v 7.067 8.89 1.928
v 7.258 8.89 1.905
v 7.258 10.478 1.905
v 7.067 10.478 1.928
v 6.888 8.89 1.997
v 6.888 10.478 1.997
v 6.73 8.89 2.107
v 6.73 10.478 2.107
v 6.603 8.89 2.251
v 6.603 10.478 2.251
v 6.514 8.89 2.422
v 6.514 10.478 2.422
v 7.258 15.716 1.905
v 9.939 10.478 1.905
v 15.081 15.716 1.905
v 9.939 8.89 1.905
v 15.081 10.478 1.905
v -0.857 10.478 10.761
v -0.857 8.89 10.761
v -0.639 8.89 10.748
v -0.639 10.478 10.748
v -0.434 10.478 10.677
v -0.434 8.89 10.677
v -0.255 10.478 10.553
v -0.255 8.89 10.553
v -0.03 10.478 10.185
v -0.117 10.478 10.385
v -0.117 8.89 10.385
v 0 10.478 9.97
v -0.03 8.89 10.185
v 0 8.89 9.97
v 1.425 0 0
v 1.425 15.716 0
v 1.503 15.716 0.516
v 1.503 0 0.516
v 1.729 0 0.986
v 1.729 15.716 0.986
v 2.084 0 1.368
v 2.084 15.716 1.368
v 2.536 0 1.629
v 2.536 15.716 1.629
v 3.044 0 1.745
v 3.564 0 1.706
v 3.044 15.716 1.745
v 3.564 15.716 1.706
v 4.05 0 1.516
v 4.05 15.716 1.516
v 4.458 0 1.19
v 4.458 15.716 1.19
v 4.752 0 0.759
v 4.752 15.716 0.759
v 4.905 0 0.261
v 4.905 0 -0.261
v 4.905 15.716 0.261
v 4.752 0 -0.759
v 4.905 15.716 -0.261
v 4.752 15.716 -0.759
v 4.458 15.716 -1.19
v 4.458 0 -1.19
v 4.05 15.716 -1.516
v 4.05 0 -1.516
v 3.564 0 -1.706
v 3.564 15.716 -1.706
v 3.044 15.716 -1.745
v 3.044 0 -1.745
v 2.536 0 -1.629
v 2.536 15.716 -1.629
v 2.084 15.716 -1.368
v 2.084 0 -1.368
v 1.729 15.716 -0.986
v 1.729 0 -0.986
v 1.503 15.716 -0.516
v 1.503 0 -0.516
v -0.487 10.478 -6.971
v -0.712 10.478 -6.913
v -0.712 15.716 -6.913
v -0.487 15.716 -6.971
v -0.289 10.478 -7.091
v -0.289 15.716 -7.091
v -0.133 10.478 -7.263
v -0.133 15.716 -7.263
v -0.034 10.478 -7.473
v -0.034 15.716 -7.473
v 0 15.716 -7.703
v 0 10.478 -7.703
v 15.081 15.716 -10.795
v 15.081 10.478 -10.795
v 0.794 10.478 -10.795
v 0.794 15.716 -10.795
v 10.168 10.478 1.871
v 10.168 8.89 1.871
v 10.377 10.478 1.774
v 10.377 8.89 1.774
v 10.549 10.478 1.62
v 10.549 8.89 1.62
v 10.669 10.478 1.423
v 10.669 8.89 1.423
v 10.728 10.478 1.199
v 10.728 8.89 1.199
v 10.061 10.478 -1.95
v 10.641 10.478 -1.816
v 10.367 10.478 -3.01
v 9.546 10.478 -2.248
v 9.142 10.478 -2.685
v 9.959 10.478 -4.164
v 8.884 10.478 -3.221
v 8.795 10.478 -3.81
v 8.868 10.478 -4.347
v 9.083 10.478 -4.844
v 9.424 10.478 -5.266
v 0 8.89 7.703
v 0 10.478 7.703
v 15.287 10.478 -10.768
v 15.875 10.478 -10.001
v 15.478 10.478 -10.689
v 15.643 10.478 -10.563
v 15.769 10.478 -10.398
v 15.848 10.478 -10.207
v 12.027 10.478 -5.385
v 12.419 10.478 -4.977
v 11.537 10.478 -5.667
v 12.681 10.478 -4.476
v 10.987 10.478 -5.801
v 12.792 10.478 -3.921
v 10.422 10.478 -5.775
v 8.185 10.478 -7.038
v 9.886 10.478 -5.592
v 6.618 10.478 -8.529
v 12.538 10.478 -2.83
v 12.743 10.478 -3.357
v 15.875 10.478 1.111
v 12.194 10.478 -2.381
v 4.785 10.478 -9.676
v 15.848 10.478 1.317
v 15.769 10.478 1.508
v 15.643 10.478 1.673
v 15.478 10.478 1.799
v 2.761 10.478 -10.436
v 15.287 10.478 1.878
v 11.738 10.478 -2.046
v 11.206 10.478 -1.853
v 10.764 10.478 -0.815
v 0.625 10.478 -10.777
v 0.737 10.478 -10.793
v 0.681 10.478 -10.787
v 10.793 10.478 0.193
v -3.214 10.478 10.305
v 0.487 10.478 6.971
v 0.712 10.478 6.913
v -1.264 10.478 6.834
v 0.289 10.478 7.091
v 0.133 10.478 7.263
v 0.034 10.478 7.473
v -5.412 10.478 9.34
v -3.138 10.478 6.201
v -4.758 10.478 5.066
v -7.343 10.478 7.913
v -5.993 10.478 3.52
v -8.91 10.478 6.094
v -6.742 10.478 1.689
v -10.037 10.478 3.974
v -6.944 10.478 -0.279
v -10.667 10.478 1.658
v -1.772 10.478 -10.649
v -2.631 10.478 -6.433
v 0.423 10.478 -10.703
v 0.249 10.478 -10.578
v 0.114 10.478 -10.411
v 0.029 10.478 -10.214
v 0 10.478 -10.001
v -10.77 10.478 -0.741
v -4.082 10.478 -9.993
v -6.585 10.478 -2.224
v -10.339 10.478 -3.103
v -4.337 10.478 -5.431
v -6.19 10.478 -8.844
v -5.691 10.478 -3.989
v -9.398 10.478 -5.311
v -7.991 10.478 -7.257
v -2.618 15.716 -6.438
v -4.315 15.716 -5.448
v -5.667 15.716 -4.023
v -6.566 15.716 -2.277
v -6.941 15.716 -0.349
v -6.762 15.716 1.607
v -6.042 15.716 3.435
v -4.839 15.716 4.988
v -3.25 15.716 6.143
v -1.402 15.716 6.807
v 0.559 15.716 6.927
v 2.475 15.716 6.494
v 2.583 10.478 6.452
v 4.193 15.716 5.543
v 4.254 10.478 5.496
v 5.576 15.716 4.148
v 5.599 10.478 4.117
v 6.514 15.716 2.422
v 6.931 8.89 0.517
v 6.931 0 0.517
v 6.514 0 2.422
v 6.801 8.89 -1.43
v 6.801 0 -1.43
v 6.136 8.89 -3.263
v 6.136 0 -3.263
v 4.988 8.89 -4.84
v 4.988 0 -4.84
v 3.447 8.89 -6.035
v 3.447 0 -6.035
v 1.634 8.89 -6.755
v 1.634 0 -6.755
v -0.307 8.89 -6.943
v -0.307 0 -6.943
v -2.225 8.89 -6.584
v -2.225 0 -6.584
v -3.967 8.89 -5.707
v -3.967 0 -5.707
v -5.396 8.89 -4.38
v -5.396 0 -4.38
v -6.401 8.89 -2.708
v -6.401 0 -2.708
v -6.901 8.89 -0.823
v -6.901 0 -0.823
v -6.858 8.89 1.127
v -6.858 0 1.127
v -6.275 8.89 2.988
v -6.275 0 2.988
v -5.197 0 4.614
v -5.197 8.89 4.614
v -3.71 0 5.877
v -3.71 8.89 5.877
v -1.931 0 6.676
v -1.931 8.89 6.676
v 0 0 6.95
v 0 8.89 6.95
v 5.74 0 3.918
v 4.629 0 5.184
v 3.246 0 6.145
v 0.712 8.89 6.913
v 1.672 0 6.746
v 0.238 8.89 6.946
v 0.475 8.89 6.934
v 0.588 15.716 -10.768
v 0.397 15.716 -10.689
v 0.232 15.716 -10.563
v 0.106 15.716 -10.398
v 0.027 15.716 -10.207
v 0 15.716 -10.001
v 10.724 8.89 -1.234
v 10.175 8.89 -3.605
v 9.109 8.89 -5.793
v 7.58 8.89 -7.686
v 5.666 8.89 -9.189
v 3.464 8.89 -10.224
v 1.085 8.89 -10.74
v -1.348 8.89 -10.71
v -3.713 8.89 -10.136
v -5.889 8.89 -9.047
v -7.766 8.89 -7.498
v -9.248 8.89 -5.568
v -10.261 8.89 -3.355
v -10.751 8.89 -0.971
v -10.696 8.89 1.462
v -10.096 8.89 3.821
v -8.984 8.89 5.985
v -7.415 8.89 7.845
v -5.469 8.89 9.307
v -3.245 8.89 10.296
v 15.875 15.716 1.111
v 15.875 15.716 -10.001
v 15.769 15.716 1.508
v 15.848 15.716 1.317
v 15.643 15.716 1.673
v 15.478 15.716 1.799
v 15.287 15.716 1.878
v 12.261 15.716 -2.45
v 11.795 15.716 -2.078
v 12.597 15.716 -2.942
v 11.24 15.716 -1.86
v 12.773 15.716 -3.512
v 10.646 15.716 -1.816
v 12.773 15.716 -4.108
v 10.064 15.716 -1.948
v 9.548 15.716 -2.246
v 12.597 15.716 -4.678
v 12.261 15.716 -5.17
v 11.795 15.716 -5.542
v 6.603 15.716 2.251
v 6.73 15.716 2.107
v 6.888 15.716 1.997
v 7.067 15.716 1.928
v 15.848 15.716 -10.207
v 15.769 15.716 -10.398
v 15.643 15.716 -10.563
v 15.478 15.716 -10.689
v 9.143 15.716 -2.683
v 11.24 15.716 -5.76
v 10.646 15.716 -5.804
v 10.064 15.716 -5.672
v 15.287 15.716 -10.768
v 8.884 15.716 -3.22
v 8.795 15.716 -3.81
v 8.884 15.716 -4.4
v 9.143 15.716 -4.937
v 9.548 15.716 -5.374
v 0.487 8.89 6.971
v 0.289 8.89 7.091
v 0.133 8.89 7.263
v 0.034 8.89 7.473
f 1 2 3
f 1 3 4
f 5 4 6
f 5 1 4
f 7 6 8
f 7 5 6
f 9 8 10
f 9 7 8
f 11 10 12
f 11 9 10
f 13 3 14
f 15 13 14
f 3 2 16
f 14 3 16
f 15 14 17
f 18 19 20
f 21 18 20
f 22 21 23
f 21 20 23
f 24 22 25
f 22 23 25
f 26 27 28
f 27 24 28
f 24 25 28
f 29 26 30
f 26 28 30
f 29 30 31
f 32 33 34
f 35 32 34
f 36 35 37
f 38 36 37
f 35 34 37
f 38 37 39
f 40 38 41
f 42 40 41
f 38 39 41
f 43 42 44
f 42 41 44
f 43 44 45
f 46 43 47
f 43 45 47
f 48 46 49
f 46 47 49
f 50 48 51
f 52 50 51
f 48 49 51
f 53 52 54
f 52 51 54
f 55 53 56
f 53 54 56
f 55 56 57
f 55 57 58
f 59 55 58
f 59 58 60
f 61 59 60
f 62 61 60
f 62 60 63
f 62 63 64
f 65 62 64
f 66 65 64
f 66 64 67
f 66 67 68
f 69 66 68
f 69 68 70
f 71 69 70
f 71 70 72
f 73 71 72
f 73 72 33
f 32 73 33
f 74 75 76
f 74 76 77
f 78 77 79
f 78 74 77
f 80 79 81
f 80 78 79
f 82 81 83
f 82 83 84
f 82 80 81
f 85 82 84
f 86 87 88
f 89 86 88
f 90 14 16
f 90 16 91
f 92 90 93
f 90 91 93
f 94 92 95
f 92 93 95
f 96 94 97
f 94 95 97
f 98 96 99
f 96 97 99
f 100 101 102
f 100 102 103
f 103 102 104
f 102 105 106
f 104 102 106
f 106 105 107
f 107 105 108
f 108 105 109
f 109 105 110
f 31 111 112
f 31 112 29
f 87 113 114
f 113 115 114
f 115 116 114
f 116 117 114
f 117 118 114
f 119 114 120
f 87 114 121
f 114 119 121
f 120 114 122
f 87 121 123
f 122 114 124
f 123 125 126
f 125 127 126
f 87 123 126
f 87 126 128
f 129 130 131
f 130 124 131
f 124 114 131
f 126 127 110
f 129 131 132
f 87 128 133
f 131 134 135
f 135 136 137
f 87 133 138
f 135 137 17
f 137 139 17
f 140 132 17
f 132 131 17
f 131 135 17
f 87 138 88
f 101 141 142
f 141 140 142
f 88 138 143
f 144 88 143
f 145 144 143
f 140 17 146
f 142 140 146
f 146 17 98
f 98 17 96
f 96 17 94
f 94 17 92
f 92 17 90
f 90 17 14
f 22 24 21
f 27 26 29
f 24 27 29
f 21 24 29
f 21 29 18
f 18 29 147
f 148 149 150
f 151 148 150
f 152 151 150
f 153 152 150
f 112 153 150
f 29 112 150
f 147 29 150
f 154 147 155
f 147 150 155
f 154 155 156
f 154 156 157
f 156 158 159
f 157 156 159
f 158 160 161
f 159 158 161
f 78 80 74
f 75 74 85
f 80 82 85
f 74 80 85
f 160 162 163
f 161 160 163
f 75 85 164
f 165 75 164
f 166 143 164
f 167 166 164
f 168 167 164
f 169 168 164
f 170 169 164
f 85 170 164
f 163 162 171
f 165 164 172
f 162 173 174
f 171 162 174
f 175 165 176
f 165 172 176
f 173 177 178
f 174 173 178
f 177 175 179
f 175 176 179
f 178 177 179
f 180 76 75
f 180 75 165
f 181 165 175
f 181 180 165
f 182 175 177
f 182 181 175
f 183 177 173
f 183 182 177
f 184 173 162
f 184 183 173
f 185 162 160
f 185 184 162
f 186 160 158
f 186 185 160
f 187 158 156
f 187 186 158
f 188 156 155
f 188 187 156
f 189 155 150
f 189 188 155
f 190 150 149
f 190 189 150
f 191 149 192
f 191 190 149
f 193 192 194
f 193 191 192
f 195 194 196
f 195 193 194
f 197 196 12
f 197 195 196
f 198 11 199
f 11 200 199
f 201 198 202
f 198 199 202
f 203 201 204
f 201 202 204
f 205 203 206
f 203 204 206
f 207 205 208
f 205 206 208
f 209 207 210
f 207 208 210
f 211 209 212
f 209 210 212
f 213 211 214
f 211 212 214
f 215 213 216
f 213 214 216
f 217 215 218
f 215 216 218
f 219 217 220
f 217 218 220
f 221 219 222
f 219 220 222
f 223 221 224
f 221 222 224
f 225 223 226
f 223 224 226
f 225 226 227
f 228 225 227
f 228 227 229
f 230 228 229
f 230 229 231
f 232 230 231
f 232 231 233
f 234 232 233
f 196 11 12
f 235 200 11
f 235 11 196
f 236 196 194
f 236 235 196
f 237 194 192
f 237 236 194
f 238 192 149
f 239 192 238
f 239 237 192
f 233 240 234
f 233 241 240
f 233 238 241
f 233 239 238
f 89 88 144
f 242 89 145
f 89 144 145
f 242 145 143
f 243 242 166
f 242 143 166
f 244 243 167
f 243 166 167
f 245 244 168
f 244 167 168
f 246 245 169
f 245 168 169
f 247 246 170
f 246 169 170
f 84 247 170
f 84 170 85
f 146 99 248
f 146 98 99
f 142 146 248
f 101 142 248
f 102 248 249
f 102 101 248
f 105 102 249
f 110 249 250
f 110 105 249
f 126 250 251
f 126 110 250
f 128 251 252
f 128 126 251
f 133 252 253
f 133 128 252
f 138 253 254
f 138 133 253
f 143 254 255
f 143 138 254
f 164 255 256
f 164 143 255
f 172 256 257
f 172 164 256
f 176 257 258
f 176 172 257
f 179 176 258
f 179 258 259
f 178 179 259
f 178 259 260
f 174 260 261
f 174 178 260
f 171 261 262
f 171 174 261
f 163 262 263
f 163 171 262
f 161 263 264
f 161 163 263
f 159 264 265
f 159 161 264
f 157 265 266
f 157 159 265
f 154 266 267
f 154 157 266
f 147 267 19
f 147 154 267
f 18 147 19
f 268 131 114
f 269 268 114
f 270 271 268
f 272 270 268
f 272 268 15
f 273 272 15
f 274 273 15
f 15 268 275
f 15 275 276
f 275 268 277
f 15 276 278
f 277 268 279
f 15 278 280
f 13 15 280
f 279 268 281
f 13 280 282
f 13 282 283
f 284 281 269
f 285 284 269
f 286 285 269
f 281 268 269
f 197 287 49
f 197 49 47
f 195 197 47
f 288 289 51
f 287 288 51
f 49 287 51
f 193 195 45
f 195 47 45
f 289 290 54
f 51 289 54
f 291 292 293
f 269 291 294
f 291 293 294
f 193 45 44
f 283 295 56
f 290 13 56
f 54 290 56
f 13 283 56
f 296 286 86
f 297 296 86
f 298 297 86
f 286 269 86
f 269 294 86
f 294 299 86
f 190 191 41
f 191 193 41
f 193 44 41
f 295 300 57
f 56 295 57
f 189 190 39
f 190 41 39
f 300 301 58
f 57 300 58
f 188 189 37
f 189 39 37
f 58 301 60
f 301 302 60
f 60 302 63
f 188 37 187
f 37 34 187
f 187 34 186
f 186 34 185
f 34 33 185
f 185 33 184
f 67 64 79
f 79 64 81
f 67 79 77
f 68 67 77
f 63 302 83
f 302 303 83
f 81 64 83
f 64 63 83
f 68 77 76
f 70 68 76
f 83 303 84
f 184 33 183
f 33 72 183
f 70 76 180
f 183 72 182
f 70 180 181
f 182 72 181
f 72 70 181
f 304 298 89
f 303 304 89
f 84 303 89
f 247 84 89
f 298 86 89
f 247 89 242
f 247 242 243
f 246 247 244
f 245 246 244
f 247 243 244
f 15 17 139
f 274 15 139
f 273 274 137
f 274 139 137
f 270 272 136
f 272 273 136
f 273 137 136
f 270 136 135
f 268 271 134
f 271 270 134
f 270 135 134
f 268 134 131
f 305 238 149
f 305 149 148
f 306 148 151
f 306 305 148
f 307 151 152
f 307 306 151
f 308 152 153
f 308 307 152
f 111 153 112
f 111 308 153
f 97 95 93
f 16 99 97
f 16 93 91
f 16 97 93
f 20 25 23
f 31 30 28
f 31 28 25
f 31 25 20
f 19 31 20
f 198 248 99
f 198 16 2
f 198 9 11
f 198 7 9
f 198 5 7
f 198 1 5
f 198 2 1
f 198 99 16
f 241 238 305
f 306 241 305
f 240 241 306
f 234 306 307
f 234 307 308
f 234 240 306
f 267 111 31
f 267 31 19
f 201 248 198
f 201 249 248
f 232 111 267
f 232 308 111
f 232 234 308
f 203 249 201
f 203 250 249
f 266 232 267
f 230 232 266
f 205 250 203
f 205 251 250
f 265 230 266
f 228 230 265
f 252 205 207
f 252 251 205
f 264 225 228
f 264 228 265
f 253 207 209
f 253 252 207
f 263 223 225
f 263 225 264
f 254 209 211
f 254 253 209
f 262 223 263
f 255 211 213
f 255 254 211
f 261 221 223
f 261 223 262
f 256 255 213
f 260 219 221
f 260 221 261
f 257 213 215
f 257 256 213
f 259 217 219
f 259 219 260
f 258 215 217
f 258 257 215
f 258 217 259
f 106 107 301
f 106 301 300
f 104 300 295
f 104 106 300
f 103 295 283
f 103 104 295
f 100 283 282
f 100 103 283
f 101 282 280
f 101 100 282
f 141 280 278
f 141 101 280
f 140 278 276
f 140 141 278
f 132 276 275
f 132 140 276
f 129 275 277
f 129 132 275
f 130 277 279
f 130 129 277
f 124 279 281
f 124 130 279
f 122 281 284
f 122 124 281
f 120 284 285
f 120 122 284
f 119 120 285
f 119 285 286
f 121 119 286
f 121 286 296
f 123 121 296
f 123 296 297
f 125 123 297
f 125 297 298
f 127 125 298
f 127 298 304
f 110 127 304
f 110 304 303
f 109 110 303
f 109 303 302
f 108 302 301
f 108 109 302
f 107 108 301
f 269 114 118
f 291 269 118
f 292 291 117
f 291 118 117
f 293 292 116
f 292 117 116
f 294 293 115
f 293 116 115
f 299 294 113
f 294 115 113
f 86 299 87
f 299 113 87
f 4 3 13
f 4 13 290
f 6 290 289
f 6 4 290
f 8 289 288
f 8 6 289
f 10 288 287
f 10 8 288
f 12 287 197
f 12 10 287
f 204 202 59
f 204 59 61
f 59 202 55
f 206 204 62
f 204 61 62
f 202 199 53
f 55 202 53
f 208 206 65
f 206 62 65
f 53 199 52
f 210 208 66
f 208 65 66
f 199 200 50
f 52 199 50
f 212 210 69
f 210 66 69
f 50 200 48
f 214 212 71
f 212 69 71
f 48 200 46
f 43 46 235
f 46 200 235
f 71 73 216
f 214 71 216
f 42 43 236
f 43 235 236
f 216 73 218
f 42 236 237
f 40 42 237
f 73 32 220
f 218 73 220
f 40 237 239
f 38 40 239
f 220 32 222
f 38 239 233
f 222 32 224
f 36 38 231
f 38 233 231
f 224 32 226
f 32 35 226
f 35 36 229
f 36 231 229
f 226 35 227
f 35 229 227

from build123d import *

# Parameters (mm, degrees)
SKETCH2_W           = 5.23875
SKETCH2_H           = 6.95
SKETCH2_W_2         = 1.5875
SKETCH2_H_2         = 3.845
SKETCH2_W_3         = 17.78
SKETCH3_R           = 11.338051479
CUT_EXTRUDE1_DEPTH  = 21.336
SKETCH5_R           = 1.75
CUT_EXTRUDE3_DEPTH  = 27.432
BOSS_EXTRUDE2_START = -5.23875
SKETCH5_3_R         = 2
BOSS_EXTRUDE2_DEPTH = 5.23875
FILLET1_R           = 0.79375
CUT_EXTRUDE4_START  = -14.224
CUT_EXTRUDE4_DEPTH  = 14.224
FILLET2_R           = 0.79375


with BuildPart() as part:
    # Sketch2 → Revolve2 (revolve)
    with BuildSketch(Plane(origin=(0, 0, 0), x_dir=(0, 1, 0), z_dir=(0, 0, 1)), mode=Mode.PRIVATE) as revolve2_sk:
        with Locations((-13.096875, 3.475)):
            Rectangle(SKETCH2_W, SKETCH2_H)
        with Locations((-9.68375, 3.475)):
            Rectangle(SKETCH2_W_2, SKETCH2_H)
        with Locations((-9.68375, 8.8725)):
            Rectangle(SKETCH2_W_2, SKETCH2_H_2)
        with Locations((0, 3.475)):
            Rectangle(SKETCH2_W_3, SKETCH2_H)
        with Locations((9.68375, 3.475)):
            Rectangle(SKETCH2_W_2, SKETCH2_H)
        with Locations((9.68375, 8.8725)):
            Rectangle(SKETCH2_W_2, SKETCH2_H_2)
        with Locations((13.096875, 3.475)):
            Rectangle(SKETCH2_W, SKETCH2_H)
    revolve(revolve2_sk.sketch.rotate(Axis((0, -15.71625, 0), (0, 1, 0)), 180), axis=Axis((0, -15.71625, 0), (0, 1, 0)))

    # Sketch3 → Cut-Extrude1 (cut)
    with BuildSketch(Plane(origin=(0, 0, 0), x_dir=(-1, 0, 0), z_dir=(0, 1, 0))):
        Circle(SKETCH3_R)
    extrude(amount=-CUT_EXTRUDE1_DEPTH, mode=Mode.SUBTRACT)

    # Sketch5 → Cut-Extrude3 (cut)
    with BuildSketch(Plane(origin=(0, 15.71625, 0), x_dir=(-1, 0, 0), z_dir=(0, 1, 0))):
        with Locations((-3.175, 0)):
            Circle(SKETCH5_R)
    extrude(amount=-CUT_EXTRUDE3_DEPTH, mode=Mode.SUBTRACT)

    # Sketch5<3> → Boss-Extrude2 (add)
    with BuildSketch(Plane(origin=(0, 15.71625, 0), x_dir=(-1, 0, 0), z_dir=(0, 1, 0)).offset(BOSS_EXTRUDE2_START)):
        with BuildLine():
            Line((-15.875, -10.795), (0, -10.795))
            Line((0, -10.795), (0, -6.95))
            ThreePointArc((0, -6.95), (-5.547172703, -4.187048483), (-6.683821886, 1.905))
            Line((-6.683821886, 1.905), (-15.875, 1.905))
            Line((-15.875, 1.905), (-15.875, -10.795))
        make_face()
        with Locations((-10.795, -3.81)):
            Circle(SKETCH5_3_R, mode=Mode.SUBTRACT)
    extrude(amount=BOSS_EXTRUDE2_DEPTH)

    # Fillet1
    # the kernel refuses this fillet: 0.79375 mm, written as the material it adds along each edge
    with BuildSketch(Plane(origin=(0, 10.4775, -6.95), x_dir=(-0.9986823309895368, 0, 0.051318629846335534), z_dir=(0, 1, 0))) as fillet1_piece_1:
        with BuildLine():
            CenterArc((0.754063117, -0.7927041), FILLET1_R, 92.941633047, 84.116733906)
            Line((-0.038640983, -0.751969938), (0, 0))
            ThreePointArc((0, 0), (0.356664477, -0.0091578), (0.713328955, 0))
        make_face()
    extrude(amount=5.23875)
    with BuildSketch(Plane(origin=(6.683821886, 9.041391923, 1.905), x_dir=(1, 0, 0), z_dir=(0, 1, 0))) as fillet1_piece_2:
        with BuildLine():
            CenterArc((0.574443231, -0.79375), FILLET1_R, 90, 69.603984808)
            ThreePointArc((-0.169543589, -0.51712268), (-0.079708314, -0.26022145), (0, 0))
            Line((0, 0), (0.574443231, 0))
        make_face()
    extrude(amount=6.674858077)
    # the kernel refuses this fillet: 0.79375 mm, written as the material it takes off along each edge
    with BuildSketch(Plane(origin=(0, 10.4775, -10.795), x_dir=(1, 0, 0), z_dir=(0, 1, 0))) as fillet1_2_piece_1:
        with BuildLine():
            CenterArc((FILLET1_R, -FILLET1_R), FILLET1_R, 90, 90)
            Line((0, -FILLET1_R), (0, 0))
            Line((0, 0), (FILLET1_R, 0))
        make_face()
    extrude(amount=7.223125, mode=Mode.SUBTRACT)
    with BuildSketch(Plane(origin=(15.875, 8.493125, 1.905), x_dir=(0, 0, -1), z_dir=(0, 1, 0)), Plane(origin=(15.875, 8.493125, -10.795), x_dir=(-1, 0, 0), z_dir=(0, 1, 0))) as fillet1_2_piece_2:
        with BuildLine():
            CenterArc((FILLET1_R, FILLET1_R), FILLET1_R, 180, 90)
            Line((0, FILLET1_R), (0, 0))
            Line((0, 0), (FILLET1_R, 0))
        make_face()
    extrude(amount=9.2075, mode=Mode.SUBTRACT)

    # Sketch6 → Cut-Extrude4 (cut)
    with BuildSketch(Plane(origin=(0, 10.4775, 0), x_dir=(-1, 0, 0), z_dir=(0, 1, 0)).offset(CUT_EXTRUDE4_START)):
        with BuildLine():
            ThreePointArc((-6.514278297, 2.42212268), (-3.966657748, 5.70684907), (0, 6.95))
            Line((0, 6.95), (0, 10.795))
            ThreePointArc((0, 10.795), (-6.927032193, 8.279387055), (-10.625582337, 1.905))
            Line((-10.625582337, 1.905), (-7.258265116, 1.905))
            ThreePointArc((-7.258265116, 1.905), (-6.805238557, 2.046978568), (-6.514278297, 2.42212268))
        make_face()
    extrude(amount=CUT_EXTRUDE4_DEPTH, mode=Mode.SUBTRACT)

    # Fillet2
    # the kernel refuses this fillet: 0.79375 mm, written as the material it adds along each edge
    with BuildSketch(Plane(origin=(0, 8.89, 6.95), x_dir=(0.9986823309895368, 0, -0.05131862984633391), z_dir=(0, 1, 0))) as fillet2_piece_1:
        with BuildLine():
            CenterArc((0.754063117, -0.7927041), FILLET2_R, 92.941633047, 84.116733906)
            Line((-0.038640983, -0.751969938), (0, 0))
            ThreePointArc((0, 0), (0.356664477, -0.0091578), (0.713328955, 0))
        make_face()
    extrude(amount=1.5875)
    # the kernel refuses this fillet: 0.79375 mm, written as the material it takes off along each edge
    with BuildSketch(Plane(origin=(0, 6.746443854, 10.795), x_dir=(0, 0, -1), z_dir=(0, 1, 0))) as fillet2_2_piece_1:
        with BuildLine():
            CenterArc((0.825297773, 0.79375), FILLET2_R, 175.447928579, 94.552071421)
            ThreePointArc((0.034051564, 0.856746032), (0.00851625, 0.428711229), (0, 0))
            Line((0, 0), (0.825297773, 0))
        make_face()
    extrude(amount=5.874612291, mode=Mode.SUBTRACT)
    with BuildSketch(Plane(origin=(10.625582337, 7.107567927, 1.905), x_dir=(-1, 0, 0), z_dir=(0, 1, 0))) as fillet2_2_piece_2:
        with BuildLine():
            CenterArc((0.686260177, -0.79375), FILLET2_R, 90, 83.620629792)
            ThreePointArc((-0.102574915, -0.705555556), (-0.057113988, -0.351930706), (0, 0))
            Line((0, 0), (0.686260177, 0))
        make_face()
    extrude(amount=3.369932073, mode=Mode.SUBTRACT)


solid = part.part
